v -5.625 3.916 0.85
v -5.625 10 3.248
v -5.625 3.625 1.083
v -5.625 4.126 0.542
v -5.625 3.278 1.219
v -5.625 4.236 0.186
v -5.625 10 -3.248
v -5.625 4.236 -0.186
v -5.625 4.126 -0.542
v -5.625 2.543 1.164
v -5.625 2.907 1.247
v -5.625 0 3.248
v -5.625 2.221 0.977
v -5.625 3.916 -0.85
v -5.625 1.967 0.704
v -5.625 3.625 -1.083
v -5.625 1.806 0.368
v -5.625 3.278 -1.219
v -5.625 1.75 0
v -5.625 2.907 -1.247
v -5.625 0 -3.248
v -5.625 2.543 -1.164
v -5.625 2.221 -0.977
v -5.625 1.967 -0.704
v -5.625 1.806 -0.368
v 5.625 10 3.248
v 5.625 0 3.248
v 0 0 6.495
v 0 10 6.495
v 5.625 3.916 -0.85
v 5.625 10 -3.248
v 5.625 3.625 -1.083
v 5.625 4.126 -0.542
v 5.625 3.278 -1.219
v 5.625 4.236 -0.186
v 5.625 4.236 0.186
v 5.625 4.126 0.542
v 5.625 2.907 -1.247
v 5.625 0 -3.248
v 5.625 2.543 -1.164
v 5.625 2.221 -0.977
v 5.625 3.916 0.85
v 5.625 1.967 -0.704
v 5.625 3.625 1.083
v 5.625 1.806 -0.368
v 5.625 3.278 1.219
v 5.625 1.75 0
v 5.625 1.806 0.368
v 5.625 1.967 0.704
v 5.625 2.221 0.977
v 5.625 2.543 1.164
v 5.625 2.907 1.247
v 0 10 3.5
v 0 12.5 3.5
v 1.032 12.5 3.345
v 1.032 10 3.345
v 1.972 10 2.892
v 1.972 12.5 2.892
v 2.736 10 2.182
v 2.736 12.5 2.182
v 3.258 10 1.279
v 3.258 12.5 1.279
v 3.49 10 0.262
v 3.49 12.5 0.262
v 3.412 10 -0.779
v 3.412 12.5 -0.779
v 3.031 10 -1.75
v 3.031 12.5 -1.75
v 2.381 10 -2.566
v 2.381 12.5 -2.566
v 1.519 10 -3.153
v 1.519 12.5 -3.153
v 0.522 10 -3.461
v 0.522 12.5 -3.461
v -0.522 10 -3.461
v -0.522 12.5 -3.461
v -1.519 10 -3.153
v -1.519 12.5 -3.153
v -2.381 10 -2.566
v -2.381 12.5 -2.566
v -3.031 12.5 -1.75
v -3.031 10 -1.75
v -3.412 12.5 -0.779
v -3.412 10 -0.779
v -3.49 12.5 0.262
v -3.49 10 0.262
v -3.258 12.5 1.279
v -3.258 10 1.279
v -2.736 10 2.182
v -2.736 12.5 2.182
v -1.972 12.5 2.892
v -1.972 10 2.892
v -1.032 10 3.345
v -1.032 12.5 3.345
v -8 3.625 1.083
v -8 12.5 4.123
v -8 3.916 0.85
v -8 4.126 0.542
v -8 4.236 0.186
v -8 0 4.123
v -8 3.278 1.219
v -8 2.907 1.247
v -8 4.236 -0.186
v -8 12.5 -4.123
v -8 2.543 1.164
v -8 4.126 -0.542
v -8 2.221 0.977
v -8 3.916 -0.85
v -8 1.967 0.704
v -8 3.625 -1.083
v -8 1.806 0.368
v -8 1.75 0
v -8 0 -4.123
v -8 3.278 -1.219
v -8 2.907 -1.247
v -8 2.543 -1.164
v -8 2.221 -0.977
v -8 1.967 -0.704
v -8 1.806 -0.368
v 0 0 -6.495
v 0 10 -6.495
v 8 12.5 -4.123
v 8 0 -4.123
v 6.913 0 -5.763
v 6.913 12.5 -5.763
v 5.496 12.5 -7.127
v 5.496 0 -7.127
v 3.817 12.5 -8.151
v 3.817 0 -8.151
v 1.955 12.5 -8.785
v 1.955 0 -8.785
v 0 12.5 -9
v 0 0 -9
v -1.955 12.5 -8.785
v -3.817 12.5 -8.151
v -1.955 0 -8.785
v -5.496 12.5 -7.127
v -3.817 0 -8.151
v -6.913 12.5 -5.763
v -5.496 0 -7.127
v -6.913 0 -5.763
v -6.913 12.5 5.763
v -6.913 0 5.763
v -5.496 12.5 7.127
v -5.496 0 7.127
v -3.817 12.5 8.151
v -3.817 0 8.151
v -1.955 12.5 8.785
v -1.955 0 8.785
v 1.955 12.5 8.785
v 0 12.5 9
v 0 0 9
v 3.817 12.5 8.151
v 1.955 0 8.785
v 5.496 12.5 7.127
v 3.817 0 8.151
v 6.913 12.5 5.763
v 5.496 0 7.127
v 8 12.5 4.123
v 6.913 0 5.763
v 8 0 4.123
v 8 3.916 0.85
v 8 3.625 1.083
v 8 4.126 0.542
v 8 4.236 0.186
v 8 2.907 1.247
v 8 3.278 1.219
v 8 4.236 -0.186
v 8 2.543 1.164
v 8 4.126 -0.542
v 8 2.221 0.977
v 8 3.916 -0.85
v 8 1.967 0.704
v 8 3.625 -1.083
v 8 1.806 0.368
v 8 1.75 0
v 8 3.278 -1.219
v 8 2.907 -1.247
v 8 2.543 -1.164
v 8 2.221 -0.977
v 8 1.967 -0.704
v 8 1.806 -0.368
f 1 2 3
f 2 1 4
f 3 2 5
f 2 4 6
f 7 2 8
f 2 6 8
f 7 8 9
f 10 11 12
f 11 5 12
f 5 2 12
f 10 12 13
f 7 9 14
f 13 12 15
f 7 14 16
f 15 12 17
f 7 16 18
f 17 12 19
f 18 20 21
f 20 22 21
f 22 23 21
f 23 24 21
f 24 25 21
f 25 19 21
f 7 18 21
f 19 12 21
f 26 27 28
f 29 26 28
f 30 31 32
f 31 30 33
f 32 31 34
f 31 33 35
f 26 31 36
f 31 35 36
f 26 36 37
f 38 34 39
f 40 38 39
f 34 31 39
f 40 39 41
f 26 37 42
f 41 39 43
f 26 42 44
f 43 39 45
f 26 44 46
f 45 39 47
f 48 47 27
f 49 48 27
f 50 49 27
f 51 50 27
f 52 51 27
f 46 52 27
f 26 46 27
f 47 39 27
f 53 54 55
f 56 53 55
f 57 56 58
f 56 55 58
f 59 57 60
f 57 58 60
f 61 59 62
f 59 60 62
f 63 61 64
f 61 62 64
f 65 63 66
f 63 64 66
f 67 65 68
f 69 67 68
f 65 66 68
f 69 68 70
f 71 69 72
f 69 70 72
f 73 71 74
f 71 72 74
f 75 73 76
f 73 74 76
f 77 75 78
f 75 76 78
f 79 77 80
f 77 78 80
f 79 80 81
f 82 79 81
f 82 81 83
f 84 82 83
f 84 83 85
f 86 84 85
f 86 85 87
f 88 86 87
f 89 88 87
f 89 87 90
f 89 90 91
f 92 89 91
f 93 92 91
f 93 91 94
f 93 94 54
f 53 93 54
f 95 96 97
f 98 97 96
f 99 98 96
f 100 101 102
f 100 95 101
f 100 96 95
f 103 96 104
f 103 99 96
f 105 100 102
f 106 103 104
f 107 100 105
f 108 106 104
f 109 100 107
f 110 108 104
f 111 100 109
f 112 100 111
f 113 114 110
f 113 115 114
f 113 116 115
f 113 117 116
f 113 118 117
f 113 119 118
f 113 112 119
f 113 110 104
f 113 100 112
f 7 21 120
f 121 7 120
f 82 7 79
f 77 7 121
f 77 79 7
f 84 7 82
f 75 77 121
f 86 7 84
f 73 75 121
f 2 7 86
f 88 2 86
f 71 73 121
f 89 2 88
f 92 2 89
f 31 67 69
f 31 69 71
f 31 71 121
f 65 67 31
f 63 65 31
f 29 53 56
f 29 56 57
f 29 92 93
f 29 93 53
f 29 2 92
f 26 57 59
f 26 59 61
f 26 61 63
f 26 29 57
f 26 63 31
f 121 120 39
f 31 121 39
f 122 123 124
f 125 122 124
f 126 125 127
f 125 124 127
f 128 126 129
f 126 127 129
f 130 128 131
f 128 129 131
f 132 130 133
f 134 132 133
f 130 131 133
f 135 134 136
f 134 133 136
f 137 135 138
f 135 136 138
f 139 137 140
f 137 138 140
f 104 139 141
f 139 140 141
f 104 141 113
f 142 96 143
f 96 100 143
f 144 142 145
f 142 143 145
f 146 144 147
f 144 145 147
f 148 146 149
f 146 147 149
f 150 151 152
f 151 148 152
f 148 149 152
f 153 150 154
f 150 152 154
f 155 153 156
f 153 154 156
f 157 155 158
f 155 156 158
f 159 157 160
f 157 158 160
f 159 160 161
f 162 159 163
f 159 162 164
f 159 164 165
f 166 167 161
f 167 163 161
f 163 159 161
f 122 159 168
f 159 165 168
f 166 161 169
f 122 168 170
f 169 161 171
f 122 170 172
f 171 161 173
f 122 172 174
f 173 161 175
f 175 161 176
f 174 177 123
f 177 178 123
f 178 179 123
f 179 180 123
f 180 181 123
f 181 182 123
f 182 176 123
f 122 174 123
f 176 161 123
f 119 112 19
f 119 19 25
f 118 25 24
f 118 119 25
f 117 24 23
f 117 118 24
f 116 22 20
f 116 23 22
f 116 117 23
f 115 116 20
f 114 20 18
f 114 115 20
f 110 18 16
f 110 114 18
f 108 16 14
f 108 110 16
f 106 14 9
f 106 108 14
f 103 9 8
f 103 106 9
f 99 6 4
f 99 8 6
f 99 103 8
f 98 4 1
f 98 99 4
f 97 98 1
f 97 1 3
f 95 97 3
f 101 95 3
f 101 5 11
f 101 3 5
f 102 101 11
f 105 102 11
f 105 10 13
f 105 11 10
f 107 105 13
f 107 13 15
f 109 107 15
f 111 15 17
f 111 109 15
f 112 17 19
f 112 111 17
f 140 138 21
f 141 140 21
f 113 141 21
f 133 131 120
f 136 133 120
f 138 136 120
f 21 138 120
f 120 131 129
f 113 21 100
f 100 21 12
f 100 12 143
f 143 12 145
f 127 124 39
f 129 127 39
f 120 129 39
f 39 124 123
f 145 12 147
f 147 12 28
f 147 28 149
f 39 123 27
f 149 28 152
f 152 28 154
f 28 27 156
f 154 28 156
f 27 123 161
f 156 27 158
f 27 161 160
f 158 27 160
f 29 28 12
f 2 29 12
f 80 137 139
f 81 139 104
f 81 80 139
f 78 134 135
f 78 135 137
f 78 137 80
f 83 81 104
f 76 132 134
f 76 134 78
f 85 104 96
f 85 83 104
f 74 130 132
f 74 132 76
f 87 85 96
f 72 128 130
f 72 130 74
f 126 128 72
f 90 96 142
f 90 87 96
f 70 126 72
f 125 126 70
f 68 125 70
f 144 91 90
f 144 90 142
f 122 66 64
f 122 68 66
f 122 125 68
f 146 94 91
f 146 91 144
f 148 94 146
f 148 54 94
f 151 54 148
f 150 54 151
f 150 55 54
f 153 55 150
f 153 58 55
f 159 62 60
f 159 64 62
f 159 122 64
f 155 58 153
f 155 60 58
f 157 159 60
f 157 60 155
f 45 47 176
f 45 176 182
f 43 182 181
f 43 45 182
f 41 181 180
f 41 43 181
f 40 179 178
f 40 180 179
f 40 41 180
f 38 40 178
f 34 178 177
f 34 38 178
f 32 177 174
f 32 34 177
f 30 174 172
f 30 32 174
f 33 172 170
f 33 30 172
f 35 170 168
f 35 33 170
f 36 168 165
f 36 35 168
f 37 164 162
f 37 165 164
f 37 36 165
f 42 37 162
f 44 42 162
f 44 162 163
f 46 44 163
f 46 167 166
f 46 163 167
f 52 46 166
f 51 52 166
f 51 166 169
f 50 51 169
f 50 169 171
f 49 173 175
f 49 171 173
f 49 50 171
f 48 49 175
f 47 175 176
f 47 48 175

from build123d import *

# Parameters (mm, degrees)
ESBO_O9_R                   = 9
RESSALTO_EXTRUS_O1_DEPTH    = 12.5
ESBO_O12_R                  = 3.5
CORTE_EXTRUS_O9_DEPTH       = 18.839562775
CORTE_EXTRUS_O10_DEPTH      = 10
CORTE_EXTRUS_O11_DEPTH      = 18.839562775
CORTE_EXTRUS_O11_DEPTH_BACK = 18.839562775
ESBO_O14_R                  = 1.25
CORTE_EXTRUS_O12_DEPTH      = 18.83956296


with BuildPart() as part:
    # Esboço9 → Ressalto-extrusão1 (new body)
    with BuildSketch(Plane(origin=(0, 0, 0), x_dir=(1, 0, 0), z_dir=(0, 1, 0))):
        with Locations(Location((0, 0, 0), (0, 0, 270))):
            Circle(ESBO_O9_R)
    extrude(amount=RESSALTO_EXTRUS_O1_DEPTH)

    # Esboço12 → Corte-extrusão9 (cut, through all)
    with BuildSketch(Plane(origin=(0, 12.5, 0), x_dir=(1, 0, 0), z_dir=(0, 1, 0))):
        with Locations(Location((0, 0, 0), (0, 0, 270))):
            Circle(ESBO_O12_R)
    extrude(amount=-CORTE_EXTRUS_O9_DEPTH, mode=Mode.SUBTRACT)

    # Esboço13 → Corte-extrusão10 (cut)
    with BuildSketch(Plane.XZ):
        Polygon((0, 6.495190528), (-5.625, 3.247595264), (-5.625, -3.247595264), (0, -6.495190528), (5.625, -3.247595264), (5.625, 3.247595264), align=None)
    extrude(amount=-CORTE_EXTRUS_O10_DEPTH, mode=Mode.SUBTRACT)

    # Esboço14 → Corte-extrusão11 (cut, two sides: drawn at the far end of the back side and taken through both)
    with BuildSketch(Plane(origin=(0, 0, 0), x_dir=(0, 0, -1), z_dir=(1, 0, 0)).offset(-CORTE_EXTRUS_O11_DEPTH_BACK)):
        with Locations(Location((0, 3, 0), (0, 0, 270))):
            Circle(ESBO_O14_R)
    extrude(amount=CORTE_EXTRUS_O11_DEPTH + CORTE_EXTRUS_O11_DEPTH_BACK, mode=Mode.SUBTRACT)

    # Esboço15 → Corte-extrusão12 (cut, through all)
    with BuildSketch(Plane.XZ):
        with BuildLine():
            Line((-8, 4.123105626), (-8, -4.123105626))
            ThreePointArc((-8, -4.123105626), (-9, 0), (-8, 4.123105626))
        make_face()
        with BuildLine():
            Line((8, 4.123105626), (8, -4.123105626))
            ThreePointArc((8, -4.123105626), (9, 0), (8, 4.123105626))
        make_face()
    extrude(amount=-CORTE_EXTRUS_O12_DEPTH, mode=Mode.SUBTRACT)


solid = part.part
